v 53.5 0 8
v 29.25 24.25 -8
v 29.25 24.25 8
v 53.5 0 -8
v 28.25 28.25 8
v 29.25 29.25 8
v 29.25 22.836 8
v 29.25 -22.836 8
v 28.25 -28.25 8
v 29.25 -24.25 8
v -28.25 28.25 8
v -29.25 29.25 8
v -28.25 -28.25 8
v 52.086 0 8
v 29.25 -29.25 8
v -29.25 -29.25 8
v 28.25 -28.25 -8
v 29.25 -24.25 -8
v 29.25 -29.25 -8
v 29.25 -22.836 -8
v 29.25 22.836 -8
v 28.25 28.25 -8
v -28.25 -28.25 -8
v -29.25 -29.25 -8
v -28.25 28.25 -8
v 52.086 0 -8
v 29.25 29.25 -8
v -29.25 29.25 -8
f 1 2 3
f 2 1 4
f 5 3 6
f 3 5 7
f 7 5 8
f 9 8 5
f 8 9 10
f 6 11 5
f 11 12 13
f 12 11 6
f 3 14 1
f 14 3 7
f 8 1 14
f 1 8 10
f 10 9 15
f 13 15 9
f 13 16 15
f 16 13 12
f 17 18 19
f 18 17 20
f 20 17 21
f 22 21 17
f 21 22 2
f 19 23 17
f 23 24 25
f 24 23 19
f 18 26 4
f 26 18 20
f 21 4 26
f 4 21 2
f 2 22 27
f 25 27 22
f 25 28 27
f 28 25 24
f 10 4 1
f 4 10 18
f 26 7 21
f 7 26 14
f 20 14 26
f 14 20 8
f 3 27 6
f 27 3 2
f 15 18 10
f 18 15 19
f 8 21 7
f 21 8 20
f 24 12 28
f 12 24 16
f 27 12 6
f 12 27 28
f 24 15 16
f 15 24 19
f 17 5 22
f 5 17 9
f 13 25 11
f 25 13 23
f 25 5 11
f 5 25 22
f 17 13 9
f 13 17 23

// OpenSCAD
/****************************************/
/* Ikea clock module holder				*/
/* clock_holder_ikea.scad				*/
/* Martin Korinek						*/
/* 25.01.2015							*/
/****************************************/

InnerTolerance=0.5;
Sidelength = 56+InnerTolerance;
Wallthickness =2;
Wallhight = 16;
Hangerlength= sqrt(pow(Sidelength+Wallthickness,2)/2);
echo(Hangerlength);


difference()
{
	union()
	{
		translate([(Sidelength+Wallthickness)/2-5,0,0])
		{
			rotate([0,0,45])
			{
				difference()
				{	
					cube([Hangerlength,Hangerlength,Wallhight],center=true);
					cube([Hangerlength-Wallthickness,Hangerlength-Wallthickness,Wallhight+0.1],center=true);
				}
			}	
	}
		cube([Sidelength+Wallthickness,Sidelength+Wallthickness,Wallhight],center=true);
	}
	cube([Sidelength,Sidelength,Wallhight+0.1],center=true);//+0.1 to be sure it is cut out
}
	
